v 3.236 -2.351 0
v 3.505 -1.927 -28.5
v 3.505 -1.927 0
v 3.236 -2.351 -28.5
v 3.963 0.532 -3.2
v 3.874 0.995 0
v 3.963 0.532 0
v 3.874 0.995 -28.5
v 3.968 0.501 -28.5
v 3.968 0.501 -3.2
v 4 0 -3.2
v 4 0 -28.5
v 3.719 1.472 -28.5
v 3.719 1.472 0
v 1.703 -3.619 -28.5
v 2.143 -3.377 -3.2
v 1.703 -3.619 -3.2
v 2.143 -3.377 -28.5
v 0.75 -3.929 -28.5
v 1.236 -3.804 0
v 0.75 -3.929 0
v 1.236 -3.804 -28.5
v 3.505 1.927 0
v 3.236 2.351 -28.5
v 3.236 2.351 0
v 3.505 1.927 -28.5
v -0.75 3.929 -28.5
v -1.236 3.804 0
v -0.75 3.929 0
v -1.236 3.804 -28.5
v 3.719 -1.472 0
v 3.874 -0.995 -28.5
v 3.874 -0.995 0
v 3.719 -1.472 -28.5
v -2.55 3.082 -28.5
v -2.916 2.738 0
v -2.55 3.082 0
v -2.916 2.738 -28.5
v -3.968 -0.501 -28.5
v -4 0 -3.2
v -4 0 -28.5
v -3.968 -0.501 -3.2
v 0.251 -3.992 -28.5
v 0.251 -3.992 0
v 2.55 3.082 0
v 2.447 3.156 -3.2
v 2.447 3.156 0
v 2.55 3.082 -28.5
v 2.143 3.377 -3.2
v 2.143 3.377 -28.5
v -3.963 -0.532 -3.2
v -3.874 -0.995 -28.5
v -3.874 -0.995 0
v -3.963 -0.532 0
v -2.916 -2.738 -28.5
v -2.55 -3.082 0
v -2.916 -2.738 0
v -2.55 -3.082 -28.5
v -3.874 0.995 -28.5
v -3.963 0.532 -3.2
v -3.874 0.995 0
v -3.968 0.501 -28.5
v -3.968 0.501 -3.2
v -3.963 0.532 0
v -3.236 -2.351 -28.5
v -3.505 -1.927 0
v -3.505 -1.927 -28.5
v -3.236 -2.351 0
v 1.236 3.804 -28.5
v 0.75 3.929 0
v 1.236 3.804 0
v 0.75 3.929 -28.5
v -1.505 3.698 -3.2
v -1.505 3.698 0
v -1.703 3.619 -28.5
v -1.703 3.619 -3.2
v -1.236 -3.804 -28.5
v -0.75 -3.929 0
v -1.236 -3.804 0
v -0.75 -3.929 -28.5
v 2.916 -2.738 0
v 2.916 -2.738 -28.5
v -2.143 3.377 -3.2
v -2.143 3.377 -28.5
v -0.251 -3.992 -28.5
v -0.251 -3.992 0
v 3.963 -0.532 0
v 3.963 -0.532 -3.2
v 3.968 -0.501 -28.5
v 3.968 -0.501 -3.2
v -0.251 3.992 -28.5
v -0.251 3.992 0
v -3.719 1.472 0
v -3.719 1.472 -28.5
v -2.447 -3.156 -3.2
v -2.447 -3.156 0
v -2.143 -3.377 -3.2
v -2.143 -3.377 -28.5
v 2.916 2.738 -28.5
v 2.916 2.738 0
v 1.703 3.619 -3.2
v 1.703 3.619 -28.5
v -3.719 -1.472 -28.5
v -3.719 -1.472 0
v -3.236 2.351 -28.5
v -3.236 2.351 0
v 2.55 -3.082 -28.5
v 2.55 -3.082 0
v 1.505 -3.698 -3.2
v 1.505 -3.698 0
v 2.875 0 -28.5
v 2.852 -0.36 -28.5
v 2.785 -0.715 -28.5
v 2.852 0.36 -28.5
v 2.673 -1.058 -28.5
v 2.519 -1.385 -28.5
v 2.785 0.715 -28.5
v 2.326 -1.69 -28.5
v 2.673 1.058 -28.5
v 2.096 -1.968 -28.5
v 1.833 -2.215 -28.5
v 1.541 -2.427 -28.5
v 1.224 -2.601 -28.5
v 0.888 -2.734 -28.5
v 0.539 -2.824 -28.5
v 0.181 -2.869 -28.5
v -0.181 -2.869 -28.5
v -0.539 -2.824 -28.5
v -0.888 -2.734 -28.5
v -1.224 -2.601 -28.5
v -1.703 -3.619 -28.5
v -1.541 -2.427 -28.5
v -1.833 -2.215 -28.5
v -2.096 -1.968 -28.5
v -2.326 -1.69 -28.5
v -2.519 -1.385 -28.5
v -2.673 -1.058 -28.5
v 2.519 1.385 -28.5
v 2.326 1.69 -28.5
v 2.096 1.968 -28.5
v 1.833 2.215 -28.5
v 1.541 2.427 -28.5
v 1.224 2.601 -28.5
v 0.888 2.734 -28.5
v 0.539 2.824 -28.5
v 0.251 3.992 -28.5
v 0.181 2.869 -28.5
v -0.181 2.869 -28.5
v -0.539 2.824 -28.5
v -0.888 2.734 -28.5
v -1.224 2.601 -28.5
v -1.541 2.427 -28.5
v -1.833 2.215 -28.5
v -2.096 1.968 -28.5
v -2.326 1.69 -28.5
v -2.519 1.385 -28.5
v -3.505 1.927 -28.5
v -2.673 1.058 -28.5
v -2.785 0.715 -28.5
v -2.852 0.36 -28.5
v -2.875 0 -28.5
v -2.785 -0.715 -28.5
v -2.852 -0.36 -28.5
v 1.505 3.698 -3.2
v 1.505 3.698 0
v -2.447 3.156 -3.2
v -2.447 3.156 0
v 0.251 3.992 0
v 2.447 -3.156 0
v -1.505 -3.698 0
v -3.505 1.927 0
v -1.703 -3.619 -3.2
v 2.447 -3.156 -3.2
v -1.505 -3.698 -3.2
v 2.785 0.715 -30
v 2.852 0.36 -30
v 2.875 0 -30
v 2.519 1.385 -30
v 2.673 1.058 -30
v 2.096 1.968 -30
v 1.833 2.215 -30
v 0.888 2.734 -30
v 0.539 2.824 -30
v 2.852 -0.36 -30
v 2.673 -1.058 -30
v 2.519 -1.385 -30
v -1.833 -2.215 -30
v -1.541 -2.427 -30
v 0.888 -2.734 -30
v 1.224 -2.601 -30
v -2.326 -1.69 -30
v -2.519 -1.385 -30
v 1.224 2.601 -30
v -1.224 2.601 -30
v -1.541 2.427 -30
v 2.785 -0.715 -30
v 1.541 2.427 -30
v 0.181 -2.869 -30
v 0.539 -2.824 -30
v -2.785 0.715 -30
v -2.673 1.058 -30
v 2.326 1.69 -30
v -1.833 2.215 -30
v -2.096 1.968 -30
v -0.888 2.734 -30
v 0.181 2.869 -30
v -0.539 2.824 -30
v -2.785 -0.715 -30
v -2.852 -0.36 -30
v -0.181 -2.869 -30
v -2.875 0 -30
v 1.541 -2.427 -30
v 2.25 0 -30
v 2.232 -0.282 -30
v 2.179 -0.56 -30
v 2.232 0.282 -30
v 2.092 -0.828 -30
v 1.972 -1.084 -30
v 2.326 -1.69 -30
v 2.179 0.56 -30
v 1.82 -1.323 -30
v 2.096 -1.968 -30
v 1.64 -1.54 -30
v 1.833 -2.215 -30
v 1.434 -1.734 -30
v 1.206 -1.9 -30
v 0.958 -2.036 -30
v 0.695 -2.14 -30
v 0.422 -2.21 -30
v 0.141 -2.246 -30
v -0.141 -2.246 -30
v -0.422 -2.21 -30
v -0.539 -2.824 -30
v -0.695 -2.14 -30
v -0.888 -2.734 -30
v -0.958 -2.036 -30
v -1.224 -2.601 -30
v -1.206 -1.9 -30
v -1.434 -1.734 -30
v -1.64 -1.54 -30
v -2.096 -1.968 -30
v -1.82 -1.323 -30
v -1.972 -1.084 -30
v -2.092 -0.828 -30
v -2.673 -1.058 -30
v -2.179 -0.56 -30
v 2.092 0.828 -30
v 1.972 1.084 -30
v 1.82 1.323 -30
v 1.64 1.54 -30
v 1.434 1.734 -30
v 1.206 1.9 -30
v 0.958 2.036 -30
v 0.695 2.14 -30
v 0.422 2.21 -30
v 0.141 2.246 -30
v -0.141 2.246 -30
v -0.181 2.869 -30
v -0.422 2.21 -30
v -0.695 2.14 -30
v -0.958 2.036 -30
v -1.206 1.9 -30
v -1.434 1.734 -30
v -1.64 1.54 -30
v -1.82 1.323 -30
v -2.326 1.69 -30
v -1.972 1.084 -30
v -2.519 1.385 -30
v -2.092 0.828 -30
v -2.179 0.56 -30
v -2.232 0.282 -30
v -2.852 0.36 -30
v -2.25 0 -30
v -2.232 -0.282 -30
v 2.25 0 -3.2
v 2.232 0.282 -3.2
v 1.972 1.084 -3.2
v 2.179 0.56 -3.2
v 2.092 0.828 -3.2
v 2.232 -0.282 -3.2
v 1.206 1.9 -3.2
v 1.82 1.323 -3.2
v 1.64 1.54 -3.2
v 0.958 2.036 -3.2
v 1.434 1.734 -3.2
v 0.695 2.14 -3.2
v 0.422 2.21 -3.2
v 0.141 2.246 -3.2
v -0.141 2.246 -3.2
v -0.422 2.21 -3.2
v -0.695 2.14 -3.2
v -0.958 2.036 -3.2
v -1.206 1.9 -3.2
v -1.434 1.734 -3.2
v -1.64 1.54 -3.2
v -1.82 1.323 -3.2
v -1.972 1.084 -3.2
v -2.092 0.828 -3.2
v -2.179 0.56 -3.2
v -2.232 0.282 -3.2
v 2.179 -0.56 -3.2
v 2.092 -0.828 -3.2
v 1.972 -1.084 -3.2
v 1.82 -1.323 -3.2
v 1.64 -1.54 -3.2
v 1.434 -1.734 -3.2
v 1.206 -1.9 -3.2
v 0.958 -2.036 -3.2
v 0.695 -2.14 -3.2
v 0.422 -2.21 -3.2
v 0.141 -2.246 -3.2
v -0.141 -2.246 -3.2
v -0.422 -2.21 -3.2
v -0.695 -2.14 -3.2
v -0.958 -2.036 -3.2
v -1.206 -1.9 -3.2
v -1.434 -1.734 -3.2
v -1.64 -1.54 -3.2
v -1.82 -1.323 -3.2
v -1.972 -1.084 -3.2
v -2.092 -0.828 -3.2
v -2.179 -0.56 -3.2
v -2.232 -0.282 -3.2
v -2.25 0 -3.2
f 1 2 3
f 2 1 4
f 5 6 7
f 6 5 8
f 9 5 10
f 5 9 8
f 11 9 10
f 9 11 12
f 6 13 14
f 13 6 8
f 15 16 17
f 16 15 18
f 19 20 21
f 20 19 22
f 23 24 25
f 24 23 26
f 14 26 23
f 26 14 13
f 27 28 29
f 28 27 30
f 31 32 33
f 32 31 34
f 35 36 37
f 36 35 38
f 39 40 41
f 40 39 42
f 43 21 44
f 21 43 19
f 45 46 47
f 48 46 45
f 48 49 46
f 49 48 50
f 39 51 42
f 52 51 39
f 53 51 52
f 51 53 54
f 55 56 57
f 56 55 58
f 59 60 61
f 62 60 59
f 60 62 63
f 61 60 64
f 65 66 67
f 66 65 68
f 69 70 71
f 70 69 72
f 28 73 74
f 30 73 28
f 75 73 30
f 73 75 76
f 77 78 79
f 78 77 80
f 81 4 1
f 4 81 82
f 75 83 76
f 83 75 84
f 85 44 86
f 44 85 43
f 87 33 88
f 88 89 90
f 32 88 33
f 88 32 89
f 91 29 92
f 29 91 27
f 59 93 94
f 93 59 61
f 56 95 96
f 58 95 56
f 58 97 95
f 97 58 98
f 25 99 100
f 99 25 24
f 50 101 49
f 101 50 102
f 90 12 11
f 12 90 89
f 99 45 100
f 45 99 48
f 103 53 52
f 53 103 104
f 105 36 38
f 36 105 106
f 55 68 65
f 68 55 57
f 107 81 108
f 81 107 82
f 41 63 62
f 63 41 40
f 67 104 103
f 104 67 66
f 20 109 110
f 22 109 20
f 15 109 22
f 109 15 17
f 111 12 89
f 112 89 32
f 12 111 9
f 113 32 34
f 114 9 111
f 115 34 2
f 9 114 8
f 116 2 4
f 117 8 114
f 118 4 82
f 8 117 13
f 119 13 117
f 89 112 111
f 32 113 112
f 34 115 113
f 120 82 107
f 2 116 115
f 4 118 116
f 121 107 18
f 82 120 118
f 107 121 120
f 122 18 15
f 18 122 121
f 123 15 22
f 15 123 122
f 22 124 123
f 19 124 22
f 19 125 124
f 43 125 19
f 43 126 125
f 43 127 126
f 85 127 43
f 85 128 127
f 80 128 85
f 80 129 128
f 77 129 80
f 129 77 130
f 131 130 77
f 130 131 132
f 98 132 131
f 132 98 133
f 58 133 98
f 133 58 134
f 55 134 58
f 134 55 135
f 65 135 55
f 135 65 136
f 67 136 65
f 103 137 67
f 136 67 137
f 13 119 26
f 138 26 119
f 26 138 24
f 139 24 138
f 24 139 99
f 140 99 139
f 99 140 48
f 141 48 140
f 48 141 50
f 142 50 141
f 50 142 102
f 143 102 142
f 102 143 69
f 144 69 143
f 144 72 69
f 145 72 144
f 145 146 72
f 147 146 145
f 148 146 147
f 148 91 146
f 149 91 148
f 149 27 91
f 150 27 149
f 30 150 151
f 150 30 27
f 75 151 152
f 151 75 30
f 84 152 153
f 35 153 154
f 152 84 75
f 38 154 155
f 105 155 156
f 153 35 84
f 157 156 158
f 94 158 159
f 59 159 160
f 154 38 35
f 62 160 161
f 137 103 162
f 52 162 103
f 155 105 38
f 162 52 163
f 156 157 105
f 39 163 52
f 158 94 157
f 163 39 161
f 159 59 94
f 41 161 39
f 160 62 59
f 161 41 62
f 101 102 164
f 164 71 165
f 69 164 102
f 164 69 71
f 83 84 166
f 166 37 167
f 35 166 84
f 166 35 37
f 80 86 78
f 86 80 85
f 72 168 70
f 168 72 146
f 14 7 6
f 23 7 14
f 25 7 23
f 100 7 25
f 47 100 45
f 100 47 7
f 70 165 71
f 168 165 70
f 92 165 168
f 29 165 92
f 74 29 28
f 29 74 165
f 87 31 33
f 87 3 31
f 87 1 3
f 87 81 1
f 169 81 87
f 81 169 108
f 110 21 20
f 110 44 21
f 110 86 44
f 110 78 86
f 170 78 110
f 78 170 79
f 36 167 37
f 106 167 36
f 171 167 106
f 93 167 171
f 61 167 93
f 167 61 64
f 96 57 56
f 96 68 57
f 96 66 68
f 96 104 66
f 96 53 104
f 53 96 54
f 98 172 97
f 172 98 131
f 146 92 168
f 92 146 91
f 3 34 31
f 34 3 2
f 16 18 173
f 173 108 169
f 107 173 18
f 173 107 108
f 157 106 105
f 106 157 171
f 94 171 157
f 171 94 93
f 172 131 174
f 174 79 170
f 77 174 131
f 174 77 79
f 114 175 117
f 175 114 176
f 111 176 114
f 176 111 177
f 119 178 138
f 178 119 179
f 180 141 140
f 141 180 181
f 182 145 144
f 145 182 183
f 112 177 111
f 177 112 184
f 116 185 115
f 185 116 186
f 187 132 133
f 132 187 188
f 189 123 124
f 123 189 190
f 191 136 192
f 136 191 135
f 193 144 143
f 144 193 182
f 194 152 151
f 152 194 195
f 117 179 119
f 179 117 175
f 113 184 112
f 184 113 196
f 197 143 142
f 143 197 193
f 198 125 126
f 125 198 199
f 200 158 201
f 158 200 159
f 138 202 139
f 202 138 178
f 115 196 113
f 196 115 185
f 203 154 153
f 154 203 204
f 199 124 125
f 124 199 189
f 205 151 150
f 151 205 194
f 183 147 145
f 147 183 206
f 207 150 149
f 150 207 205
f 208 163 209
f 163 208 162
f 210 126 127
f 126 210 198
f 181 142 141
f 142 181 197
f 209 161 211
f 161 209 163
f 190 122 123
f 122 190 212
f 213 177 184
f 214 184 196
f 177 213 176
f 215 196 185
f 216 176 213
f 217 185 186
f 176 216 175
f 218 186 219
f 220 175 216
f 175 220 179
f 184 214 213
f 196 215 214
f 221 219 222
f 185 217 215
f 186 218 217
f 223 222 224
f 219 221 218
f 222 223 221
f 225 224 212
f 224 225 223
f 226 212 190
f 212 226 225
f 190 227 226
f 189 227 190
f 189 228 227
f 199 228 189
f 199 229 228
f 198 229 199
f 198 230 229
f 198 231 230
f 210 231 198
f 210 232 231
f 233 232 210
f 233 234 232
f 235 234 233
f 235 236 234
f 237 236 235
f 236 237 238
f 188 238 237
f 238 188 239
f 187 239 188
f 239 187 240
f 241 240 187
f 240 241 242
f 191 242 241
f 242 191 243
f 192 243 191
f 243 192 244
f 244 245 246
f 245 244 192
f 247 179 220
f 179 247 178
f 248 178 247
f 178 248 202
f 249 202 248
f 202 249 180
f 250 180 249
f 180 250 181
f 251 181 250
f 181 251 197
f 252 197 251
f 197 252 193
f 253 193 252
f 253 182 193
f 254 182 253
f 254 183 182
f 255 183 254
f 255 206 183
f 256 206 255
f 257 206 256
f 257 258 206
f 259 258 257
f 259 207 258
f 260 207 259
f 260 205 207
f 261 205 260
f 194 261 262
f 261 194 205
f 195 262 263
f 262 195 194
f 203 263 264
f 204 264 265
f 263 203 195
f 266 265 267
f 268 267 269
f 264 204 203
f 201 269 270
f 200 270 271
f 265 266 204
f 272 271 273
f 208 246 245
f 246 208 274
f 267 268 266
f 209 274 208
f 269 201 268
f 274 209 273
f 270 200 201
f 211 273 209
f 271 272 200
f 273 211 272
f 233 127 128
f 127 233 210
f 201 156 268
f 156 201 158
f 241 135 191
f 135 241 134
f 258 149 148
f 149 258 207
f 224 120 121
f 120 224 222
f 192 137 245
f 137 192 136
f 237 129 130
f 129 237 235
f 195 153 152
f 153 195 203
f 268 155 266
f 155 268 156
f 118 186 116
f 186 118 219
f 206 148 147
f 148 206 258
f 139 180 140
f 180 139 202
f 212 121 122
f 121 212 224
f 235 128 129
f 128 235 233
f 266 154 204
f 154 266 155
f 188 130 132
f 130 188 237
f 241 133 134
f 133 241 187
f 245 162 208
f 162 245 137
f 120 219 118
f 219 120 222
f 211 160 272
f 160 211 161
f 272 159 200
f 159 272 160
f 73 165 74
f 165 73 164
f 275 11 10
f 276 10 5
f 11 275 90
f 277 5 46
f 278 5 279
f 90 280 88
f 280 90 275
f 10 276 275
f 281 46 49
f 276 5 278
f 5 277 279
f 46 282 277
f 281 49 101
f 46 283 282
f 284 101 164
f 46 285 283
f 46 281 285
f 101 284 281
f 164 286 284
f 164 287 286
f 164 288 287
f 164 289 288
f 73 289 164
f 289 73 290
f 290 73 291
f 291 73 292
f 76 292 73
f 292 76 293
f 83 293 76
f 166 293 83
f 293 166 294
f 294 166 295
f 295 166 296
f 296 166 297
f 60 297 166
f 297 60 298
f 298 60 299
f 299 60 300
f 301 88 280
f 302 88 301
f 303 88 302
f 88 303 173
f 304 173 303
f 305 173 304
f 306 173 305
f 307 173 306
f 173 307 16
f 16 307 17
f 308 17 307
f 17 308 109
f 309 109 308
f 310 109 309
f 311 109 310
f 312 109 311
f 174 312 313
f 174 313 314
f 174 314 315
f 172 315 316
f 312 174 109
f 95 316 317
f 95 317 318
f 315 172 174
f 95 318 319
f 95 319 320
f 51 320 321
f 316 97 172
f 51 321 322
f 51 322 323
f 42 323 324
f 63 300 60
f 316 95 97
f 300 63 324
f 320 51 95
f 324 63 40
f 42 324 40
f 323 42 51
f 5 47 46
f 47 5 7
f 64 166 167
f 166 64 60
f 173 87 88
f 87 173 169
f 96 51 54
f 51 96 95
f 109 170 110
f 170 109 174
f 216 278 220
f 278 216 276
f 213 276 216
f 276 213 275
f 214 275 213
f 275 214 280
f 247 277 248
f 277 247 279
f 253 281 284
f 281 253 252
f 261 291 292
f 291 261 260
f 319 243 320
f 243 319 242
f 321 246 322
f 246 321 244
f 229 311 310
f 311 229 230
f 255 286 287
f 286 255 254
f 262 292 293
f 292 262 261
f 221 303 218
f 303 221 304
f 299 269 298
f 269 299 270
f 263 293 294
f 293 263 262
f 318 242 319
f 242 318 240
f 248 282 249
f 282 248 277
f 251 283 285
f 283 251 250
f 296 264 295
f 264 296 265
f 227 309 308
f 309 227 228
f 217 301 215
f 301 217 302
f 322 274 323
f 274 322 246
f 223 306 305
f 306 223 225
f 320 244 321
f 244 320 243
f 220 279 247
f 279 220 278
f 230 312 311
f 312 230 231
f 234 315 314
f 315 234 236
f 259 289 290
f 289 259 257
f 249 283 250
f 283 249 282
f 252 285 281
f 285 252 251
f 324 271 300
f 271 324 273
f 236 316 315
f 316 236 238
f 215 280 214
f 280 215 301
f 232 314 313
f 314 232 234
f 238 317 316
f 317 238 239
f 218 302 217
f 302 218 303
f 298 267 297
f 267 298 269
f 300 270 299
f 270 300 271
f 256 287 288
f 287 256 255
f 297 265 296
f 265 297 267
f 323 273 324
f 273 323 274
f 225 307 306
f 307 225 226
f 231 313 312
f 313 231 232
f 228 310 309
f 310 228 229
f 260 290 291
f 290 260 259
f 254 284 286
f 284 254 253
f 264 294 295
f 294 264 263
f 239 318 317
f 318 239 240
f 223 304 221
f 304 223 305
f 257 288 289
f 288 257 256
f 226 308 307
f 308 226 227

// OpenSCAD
$fn = 50;

difference() {
	union() {
		translate(v = [0, 0, -28.5]) {
			cylinder(h = 28.5, r = 4.0);
		}
		#translate(v = [0, 0, -30.0]) {
			cylinder(h = 30, r = 2.875);
		}
	}
	union() {
		translate(v = [0, 0, 0]) {
			rotate(a = [0, 0, 0]) {
				difference() {
					union() {
						translate(v = [0, 0, -3.2]) {
							linear_extrude(height = 3.2) {
								polygon(points = [[4.2698, 0.0], [2.1349000000000005, 3.697755269078796], [-2.134899999999999, 3.6977552690787965], [-4.2698, 5.228996902999369e-16], [-2.134900000000002, -3.6977552690787956], [2.1348999999999974, -3.697755269078798]]);
							}
						}
					}
					union();
				}
			}
		}
		#translate(v = [0, 0, -100.0]) {
			cylinder(h = 200, r = 2.25);
		}
	}
}
